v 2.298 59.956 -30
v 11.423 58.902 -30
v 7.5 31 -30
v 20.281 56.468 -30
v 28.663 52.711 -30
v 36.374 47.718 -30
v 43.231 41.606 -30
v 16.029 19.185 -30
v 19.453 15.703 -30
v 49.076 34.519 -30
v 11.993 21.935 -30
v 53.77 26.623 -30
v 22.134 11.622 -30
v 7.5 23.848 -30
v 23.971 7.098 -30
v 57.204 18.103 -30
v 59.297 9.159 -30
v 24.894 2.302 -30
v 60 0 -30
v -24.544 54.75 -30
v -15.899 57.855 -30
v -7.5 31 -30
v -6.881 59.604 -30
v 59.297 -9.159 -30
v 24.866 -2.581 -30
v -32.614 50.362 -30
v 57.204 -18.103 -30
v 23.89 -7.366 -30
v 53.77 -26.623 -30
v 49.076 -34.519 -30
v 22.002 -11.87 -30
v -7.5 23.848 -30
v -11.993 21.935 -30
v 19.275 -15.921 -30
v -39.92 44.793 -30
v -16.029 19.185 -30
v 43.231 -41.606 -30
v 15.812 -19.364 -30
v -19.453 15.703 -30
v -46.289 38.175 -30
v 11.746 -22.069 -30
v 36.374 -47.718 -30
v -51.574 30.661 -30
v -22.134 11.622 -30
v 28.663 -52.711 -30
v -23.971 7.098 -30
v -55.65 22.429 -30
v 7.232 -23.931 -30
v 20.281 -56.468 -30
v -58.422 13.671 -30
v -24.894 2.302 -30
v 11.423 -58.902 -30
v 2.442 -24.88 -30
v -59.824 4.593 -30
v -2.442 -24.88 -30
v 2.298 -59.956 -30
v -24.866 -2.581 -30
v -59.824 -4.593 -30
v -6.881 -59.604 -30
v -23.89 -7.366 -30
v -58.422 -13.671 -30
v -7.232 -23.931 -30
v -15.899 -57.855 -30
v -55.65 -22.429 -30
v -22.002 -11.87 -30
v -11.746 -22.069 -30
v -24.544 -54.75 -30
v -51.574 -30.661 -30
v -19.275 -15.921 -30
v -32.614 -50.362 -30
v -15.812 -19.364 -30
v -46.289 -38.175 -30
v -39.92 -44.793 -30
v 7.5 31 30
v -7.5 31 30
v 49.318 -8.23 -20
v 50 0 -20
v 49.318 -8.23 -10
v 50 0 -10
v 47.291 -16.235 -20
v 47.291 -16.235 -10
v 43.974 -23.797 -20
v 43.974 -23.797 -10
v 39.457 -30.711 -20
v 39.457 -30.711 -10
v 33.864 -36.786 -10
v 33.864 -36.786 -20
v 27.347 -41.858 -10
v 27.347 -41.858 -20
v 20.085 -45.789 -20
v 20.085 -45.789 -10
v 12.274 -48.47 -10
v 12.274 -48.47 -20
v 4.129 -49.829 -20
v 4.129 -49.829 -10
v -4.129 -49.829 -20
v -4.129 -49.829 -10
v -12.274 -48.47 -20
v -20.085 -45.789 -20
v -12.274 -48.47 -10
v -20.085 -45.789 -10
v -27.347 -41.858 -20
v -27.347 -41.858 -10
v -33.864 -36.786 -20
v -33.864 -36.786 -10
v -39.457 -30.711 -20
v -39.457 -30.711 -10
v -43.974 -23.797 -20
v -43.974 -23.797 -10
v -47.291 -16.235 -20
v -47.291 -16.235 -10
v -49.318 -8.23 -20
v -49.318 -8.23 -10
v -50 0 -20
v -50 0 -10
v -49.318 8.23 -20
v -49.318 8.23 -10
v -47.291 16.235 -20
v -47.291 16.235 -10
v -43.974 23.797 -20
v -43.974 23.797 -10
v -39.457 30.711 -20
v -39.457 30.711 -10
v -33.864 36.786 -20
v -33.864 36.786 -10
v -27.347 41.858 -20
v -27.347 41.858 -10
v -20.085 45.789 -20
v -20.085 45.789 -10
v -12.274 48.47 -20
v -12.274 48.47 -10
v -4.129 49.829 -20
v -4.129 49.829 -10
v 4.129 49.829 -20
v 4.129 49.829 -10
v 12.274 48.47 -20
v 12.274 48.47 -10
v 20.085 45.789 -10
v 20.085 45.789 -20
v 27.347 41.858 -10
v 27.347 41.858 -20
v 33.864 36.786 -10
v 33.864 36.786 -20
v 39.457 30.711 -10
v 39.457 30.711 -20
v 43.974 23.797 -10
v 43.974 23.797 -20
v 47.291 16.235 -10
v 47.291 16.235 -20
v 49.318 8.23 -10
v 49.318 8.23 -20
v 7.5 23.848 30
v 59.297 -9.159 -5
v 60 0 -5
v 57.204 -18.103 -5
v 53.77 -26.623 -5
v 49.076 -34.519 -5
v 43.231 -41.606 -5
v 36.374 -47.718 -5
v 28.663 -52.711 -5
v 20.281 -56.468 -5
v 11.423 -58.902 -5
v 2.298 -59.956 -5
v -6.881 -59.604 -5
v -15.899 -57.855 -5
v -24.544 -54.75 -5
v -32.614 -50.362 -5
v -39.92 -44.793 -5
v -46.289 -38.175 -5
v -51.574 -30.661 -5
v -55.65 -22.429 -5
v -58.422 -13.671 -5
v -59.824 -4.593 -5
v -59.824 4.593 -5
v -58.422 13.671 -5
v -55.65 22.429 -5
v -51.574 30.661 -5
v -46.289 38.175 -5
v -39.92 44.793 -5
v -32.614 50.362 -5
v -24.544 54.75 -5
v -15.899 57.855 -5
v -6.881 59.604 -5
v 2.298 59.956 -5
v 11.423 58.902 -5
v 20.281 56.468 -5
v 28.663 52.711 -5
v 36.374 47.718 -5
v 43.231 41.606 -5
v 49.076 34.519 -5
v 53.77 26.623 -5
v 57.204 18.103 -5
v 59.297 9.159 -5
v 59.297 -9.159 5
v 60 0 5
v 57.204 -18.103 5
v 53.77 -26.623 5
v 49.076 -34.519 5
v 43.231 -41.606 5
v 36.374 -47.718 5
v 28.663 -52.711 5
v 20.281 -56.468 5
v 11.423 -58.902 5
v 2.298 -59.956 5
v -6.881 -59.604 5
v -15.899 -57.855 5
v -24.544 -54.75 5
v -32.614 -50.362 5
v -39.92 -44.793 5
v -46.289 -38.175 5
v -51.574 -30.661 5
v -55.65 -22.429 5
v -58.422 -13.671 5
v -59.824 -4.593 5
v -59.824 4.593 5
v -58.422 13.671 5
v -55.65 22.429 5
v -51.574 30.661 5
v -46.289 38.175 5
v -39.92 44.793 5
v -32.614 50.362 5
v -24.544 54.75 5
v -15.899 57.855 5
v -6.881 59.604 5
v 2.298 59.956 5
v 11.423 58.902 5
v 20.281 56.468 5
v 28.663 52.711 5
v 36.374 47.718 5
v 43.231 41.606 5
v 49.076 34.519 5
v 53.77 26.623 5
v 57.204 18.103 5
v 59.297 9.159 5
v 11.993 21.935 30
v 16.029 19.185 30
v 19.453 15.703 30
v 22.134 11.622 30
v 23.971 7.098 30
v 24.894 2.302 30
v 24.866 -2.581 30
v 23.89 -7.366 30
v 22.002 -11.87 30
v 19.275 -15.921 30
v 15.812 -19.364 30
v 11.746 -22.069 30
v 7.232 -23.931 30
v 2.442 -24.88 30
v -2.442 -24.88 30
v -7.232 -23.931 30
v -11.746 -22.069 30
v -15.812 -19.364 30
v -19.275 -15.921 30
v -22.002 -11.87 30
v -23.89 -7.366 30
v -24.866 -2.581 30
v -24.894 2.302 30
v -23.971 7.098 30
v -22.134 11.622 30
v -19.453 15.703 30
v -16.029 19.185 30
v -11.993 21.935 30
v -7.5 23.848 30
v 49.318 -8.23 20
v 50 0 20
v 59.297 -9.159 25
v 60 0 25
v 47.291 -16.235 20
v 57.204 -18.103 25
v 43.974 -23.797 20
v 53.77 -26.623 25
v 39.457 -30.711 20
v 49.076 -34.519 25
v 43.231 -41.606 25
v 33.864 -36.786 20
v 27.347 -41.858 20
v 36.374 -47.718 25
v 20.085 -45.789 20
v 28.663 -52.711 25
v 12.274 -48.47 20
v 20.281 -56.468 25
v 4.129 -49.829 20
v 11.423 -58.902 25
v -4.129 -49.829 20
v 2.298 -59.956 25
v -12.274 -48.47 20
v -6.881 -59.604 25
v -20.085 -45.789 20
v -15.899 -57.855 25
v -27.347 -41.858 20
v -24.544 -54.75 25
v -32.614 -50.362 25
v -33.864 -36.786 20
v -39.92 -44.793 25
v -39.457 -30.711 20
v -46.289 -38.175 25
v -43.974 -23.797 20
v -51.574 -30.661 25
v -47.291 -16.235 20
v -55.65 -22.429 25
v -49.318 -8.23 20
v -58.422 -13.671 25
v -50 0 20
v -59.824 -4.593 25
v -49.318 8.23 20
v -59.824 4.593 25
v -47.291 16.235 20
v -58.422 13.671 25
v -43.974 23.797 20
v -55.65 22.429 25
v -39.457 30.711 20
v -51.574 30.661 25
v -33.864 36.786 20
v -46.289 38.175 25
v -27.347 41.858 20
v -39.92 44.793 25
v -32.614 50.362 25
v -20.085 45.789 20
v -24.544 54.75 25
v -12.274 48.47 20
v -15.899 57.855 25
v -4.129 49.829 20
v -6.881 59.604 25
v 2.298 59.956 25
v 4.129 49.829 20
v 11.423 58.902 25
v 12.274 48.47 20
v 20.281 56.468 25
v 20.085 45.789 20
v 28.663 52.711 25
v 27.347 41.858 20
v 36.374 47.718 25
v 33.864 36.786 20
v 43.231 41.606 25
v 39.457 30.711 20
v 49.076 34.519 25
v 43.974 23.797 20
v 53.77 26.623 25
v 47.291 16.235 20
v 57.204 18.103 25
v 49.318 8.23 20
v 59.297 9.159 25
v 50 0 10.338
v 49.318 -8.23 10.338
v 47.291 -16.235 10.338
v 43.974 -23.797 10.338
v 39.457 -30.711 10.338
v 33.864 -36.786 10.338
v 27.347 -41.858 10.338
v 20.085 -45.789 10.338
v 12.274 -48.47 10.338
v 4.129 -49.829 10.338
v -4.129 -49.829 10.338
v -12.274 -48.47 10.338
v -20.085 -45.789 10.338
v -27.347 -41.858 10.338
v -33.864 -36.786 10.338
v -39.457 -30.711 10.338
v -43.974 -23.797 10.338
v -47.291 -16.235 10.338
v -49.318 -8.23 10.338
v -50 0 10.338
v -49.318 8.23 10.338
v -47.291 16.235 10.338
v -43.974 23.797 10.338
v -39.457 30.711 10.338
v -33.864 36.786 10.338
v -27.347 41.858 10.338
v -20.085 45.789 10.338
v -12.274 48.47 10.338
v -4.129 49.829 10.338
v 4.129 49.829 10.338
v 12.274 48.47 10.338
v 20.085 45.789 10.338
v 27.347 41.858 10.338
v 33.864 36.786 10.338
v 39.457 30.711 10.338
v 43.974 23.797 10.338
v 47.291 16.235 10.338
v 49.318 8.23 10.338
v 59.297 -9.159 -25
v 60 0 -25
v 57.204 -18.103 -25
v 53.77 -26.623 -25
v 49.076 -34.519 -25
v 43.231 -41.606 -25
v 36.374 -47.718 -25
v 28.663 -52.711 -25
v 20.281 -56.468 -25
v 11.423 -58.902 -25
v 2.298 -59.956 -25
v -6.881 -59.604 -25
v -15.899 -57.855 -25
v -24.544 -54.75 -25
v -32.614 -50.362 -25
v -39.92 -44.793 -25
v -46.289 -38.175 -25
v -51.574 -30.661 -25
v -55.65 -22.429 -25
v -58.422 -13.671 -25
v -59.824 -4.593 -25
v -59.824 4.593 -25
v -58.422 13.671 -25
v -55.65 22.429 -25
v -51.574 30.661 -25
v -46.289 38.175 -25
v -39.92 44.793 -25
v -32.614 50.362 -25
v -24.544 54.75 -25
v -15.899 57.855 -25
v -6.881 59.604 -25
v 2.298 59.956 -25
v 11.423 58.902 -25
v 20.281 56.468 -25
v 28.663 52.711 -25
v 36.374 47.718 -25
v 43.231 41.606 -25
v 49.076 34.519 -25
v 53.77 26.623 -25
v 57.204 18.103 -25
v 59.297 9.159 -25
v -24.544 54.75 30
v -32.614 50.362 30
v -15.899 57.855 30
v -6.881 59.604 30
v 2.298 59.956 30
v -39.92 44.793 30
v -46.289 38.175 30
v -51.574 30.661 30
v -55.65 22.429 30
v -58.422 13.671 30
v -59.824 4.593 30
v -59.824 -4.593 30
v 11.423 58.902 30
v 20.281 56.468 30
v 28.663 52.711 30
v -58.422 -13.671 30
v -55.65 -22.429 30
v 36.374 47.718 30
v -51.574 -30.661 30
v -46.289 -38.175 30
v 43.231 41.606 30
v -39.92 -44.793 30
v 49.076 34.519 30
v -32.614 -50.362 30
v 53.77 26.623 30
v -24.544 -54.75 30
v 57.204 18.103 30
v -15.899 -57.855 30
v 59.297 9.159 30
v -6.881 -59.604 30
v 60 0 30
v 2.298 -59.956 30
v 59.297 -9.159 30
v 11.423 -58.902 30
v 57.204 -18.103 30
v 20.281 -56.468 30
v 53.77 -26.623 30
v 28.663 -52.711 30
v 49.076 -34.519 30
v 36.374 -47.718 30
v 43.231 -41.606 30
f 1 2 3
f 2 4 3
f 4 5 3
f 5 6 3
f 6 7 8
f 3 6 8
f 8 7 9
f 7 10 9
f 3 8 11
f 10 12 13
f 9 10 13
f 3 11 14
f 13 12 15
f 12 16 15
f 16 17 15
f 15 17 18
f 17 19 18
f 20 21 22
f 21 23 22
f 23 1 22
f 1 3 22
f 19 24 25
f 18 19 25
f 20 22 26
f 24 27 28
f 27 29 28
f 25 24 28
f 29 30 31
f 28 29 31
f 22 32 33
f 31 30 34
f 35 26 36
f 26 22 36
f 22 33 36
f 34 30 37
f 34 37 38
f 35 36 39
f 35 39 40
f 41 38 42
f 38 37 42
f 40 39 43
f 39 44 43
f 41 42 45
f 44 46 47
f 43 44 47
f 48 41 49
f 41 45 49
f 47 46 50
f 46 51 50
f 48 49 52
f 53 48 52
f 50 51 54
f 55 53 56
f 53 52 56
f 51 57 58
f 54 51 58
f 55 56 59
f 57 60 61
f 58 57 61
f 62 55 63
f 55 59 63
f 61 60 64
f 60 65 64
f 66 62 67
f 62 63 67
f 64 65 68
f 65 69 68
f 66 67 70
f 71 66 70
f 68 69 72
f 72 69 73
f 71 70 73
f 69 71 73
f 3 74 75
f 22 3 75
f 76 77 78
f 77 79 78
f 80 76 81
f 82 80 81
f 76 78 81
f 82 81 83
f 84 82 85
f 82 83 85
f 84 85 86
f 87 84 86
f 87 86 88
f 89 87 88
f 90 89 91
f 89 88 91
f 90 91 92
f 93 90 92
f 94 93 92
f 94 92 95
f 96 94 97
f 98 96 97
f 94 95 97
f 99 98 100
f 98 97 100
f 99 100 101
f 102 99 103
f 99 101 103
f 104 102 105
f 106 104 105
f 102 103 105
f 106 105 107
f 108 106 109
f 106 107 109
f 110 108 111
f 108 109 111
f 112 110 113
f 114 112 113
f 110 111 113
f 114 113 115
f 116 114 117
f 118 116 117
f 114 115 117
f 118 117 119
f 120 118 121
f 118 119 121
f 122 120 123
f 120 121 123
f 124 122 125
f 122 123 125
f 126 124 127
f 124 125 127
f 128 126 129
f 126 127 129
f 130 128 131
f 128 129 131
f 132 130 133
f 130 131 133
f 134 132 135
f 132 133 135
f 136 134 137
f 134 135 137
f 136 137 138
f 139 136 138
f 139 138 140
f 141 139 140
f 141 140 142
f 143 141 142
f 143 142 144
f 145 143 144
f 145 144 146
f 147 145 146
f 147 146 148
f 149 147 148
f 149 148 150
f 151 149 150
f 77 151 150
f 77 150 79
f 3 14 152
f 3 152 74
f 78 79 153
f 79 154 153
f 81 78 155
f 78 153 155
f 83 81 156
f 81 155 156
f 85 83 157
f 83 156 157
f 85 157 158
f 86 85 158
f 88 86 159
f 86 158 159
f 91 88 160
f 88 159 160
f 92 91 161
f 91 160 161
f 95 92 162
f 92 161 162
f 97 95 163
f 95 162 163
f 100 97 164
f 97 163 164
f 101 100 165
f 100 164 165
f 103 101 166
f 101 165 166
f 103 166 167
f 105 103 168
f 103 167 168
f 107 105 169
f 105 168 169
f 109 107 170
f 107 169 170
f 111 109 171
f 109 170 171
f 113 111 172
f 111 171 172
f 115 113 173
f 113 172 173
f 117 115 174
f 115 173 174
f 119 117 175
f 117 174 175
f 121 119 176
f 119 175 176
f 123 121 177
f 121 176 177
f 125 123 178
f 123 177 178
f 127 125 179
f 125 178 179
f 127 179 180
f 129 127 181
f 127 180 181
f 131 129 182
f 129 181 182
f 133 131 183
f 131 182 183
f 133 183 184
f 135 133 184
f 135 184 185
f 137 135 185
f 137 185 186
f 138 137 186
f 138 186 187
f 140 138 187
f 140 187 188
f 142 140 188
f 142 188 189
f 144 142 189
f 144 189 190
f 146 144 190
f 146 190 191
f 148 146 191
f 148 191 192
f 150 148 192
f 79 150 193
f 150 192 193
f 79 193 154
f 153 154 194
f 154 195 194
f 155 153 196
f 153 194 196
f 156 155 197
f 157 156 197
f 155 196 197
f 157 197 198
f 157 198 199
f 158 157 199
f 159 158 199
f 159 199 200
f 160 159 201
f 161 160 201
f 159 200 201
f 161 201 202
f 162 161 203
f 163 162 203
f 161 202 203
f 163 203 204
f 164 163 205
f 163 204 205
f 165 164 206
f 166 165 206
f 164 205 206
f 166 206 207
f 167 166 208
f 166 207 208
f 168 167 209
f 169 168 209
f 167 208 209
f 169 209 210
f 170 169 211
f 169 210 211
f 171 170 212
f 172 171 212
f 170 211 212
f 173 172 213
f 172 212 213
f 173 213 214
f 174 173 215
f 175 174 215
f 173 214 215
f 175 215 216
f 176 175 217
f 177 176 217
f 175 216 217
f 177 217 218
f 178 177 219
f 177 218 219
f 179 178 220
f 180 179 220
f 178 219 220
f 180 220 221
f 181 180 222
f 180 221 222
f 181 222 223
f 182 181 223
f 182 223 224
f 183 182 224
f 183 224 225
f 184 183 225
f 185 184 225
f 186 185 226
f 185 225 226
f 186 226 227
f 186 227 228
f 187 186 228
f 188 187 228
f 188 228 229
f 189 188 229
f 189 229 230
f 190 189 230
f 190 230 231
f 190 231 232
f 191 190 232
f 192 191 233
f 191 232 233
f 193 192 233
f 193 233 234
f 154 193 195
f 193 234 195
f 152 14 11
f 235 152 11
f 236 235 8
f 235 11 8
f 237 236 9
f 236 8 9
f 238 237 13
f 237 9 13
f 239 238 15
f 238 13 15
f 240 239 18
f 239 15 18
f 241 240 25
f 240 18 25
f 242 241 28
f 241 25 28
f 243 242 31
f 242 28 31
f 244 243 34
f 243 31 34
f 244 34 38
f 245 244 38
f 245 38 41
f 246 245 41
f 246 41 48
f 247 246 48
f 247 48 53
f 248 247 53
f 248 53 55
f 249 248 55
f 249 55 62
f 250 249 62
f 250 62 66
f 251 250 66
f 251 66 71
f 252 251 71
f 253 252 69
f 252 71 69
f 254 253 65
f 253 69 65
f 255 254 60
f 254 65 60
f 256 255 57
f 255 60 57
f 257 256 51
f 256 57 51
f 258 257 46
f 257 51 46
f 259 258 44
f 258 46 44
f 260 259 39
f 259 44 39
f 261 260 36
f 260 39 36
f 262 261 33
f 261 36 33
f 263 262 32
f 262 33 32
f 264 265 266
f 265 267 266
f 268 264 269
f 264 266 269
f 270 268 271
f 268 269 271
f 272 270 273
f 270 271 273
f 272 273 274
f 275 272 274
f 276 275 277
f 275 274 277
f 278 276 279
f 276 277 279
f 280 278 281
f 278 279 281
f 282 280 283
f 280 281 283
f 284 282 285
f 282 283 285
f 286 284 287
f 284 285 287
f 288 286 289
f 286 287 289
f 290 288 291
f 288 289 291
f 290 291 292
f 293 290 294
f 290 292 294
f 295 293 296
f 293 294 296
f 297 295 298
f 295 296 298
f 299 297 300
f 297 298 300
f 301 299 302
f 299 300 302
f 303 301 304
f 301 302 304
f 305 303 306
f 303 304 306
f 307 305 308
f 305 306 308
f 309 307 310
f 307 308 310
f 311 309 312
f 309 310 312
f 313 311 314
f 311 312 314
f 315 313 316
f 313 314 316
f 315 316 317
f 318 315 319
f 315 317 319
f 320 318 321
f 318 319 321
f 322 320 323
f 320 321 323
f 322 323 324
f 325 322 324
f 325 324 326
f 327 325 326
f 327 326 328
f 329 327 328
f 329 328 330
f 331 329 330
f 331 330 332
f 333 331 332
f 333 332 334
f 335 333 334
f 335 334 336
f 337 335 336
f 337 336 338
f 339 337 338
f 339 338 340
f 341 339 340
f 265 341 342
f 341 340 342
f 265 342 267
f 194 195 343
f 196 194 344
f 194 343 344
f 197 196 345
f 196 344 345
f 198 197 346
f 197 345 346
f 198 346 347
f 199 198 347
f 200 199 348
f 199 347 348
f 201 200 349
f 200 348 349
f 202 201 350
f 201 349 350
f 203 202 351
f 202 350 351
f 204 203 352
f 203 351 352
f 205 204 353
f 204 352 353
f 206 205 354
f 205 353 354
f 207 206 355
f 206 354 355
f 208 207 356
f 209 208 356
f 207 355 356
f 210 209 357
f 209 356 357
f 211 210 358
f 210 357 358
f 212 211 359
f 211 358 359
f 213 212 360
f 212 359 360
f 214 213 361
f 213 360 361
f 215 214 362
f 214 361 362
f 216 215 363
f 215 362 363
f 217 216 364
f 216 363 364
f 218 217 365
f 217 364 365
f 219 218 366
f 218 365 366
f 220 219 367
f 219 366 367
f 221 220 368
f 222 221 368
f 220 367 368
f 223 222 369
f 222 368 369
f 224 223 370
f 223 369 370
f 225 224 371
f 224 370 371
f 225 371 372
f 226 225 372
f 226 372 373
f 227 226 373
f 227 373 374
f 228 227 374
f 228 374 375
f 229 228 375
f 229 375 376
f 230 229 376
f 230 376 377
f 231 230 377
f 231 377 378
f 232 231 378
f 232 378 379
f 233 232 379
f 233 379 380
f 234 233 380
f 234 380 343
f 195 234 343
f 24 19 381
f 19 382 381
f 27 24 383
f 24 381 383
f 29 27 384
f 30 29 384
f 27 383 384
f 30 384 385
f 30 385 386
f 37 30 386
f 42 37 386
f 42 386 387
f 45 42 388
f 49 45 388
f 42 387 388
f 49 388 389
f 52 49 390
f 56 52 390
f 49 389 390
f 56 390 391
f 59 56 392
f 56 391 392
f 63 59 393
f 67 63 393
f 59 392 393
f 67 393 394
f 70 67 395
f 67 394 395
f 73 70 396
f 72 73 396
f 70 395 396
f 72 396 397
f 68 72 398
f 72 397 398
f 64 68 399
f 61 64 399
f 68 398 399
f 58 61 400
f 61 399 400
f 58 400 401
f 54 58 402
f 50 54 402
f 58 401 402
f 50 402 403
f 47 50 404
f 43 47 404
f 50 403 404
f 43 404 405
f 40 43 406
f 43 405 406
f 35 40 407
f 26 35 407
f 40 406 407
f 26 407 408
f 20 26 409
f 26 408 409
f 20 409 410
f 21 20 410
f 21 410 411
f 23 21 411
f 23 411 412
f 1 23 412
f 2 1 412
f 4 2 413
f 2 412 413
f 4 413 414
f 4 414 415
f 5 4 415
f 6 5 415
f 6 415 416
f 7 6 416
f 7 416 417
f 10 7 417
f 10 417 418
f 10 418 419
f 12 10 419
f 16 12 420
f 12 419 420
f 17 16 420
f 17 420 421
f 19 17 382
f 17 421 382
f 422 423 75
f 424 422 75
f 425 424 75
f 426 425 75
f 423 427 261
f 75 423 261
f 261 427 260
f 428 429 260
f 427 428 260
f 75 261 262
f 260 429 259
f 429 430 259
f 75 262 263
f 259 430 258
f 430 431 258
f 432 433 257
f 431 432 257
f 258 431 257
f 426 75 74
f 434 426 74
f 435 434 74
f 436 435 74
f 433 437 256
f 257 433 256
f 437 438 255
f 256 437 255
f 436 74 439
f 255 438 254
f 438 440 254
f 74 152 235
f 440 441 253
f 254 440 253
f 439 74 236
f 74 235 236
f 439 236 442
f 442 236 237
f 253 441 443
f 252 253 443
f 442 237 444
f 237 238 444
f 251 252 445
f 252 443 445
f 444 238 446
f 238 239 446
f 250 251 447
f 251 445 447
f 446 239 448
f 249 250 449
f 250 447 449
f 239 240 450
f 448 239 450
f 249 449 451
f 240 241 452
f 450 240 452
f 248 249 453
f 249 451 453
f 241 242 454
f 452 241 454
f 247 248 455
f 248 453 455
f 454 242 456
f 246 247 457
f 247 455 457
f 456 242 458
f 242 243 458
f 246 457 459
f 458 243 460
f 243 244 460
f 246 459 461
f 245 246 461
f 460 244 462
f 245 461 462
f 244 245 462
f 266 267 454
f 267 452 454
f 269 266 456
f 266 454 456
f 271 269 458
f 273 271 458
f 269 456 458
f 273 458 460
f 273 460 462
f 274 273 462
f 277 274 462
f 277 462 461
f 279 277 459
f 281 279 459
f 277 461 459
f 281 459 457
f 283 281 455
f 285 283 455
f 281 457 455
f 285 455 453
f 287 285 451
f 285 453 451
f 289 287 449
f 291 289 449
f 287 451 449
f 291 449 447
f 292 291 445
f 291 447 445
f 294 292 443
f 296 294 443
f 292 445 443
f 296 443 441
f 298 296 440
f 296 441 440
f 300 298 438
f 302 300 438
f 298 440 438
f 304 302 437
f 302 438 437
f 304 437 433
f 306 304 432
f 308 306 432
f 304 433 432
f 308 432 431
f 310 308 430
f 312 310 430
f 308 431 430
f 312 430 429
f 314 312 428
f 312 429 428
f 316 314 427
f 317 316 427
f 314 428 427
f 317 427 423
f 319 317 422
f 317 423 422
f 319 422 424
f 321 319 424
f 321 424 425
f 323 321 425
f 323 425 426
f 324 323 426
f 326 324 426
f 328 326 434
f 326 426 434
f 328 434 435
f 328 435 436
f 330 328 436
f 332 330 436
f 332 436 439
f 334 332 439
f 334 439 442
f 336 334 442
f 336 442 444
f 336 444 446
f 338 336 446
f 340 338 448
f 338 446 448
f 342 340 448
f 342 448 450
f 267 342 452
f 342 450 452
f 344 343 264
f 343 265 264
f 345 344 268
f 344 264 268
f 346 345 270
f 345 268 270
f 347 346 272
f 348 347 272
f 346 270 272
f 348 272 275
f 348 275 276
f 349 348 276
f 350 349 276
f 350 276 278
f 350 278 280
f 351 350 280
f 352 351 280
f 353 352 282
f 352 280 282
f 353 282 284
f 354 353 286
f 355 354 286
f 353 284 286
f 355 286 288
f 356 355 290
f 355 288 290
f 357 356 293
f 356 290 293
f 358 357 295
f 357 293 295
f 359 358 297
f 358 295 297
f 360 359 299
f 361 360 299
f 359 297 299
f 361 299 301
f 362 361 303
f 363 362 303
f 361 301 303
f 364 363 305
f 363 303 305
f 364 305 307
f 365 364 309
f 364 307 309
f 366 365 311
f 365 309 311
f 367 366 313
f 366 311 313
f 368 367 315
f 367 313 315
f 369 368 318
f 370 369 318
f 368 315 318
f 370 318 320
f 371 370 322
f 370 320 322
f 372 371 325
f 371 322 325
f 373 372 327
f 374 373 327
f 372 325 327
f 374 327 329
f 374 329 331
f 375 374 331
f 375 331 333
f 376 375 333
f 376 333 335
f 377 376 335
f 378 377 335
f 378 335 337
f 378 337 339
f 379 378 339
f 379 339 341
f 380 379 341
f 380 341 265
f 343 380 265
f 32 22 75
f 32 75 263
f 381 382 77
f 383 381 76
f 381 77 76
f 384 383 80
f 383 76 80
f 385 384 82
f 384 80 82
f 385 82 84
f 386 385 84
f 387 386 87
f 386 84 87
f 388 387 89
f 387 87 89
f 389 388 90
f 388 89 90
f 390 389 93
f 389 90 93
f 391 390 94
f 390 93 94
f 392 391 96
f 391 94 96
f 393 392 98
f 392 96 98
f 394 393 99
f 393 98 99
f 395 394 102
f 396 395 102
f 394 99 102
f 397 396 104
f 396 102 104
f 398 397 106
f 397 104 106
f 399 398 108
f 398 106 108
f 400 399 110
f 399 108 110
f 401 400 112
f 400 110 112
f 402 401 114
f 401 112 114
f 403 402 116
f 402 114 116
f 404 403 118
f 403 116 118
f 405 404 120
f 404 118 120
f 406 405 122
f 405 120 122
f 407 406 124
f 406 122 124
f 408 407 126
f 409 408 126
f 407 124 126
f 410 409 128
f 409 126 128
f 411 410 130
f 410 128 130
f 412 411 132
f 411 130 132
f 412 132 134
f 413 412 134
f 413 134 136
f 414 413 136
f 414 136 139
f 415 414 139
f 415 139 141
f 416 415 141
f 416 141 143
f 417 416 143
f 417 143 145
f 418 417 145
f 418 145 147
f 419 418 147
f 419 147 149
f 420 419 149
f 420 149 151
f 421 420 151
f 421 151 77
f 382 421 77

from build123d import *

# Parameters (mm, degrees)
F3_DEPTH = 60.001


with BuildPart() as f1:
    # F0 (on Front) → F1 (revolve)
    with BuildSketch(Plane.XZ):
        Polygon((40, 30), (25, 30), (25, -30), (40, -30), (50, -30), (60, -30), (60, -25), (50, -20), (50, -10), (60, -5), (60, 5), (50, 10.338278207), (50, 20), (60, 25), (60, 30), (50, 30), align=None)
    revolve(axis=Axis((0, 0, 0), (0, 0, -1)))

    # F2 (on face) → F3 (cut, through all)
    with BuildSketch(Plane.XY.offset(30)):
        with BuildLine():
            Line((7.5, 31), (-7.5, 31))
            Line((-7.5, 31), (-7.5, 23.8484800354))
            ThreePointArc((-7.5, 23.8484800354), (0, 25), (7.5, 23.8484800354))
            Line((7.5, 23.8484800354), (7.5, 31))
        make_face()
    extrude(amount=-F3_DEPTH, mode=Mode.SUBTRACT)


solid = f1.part
